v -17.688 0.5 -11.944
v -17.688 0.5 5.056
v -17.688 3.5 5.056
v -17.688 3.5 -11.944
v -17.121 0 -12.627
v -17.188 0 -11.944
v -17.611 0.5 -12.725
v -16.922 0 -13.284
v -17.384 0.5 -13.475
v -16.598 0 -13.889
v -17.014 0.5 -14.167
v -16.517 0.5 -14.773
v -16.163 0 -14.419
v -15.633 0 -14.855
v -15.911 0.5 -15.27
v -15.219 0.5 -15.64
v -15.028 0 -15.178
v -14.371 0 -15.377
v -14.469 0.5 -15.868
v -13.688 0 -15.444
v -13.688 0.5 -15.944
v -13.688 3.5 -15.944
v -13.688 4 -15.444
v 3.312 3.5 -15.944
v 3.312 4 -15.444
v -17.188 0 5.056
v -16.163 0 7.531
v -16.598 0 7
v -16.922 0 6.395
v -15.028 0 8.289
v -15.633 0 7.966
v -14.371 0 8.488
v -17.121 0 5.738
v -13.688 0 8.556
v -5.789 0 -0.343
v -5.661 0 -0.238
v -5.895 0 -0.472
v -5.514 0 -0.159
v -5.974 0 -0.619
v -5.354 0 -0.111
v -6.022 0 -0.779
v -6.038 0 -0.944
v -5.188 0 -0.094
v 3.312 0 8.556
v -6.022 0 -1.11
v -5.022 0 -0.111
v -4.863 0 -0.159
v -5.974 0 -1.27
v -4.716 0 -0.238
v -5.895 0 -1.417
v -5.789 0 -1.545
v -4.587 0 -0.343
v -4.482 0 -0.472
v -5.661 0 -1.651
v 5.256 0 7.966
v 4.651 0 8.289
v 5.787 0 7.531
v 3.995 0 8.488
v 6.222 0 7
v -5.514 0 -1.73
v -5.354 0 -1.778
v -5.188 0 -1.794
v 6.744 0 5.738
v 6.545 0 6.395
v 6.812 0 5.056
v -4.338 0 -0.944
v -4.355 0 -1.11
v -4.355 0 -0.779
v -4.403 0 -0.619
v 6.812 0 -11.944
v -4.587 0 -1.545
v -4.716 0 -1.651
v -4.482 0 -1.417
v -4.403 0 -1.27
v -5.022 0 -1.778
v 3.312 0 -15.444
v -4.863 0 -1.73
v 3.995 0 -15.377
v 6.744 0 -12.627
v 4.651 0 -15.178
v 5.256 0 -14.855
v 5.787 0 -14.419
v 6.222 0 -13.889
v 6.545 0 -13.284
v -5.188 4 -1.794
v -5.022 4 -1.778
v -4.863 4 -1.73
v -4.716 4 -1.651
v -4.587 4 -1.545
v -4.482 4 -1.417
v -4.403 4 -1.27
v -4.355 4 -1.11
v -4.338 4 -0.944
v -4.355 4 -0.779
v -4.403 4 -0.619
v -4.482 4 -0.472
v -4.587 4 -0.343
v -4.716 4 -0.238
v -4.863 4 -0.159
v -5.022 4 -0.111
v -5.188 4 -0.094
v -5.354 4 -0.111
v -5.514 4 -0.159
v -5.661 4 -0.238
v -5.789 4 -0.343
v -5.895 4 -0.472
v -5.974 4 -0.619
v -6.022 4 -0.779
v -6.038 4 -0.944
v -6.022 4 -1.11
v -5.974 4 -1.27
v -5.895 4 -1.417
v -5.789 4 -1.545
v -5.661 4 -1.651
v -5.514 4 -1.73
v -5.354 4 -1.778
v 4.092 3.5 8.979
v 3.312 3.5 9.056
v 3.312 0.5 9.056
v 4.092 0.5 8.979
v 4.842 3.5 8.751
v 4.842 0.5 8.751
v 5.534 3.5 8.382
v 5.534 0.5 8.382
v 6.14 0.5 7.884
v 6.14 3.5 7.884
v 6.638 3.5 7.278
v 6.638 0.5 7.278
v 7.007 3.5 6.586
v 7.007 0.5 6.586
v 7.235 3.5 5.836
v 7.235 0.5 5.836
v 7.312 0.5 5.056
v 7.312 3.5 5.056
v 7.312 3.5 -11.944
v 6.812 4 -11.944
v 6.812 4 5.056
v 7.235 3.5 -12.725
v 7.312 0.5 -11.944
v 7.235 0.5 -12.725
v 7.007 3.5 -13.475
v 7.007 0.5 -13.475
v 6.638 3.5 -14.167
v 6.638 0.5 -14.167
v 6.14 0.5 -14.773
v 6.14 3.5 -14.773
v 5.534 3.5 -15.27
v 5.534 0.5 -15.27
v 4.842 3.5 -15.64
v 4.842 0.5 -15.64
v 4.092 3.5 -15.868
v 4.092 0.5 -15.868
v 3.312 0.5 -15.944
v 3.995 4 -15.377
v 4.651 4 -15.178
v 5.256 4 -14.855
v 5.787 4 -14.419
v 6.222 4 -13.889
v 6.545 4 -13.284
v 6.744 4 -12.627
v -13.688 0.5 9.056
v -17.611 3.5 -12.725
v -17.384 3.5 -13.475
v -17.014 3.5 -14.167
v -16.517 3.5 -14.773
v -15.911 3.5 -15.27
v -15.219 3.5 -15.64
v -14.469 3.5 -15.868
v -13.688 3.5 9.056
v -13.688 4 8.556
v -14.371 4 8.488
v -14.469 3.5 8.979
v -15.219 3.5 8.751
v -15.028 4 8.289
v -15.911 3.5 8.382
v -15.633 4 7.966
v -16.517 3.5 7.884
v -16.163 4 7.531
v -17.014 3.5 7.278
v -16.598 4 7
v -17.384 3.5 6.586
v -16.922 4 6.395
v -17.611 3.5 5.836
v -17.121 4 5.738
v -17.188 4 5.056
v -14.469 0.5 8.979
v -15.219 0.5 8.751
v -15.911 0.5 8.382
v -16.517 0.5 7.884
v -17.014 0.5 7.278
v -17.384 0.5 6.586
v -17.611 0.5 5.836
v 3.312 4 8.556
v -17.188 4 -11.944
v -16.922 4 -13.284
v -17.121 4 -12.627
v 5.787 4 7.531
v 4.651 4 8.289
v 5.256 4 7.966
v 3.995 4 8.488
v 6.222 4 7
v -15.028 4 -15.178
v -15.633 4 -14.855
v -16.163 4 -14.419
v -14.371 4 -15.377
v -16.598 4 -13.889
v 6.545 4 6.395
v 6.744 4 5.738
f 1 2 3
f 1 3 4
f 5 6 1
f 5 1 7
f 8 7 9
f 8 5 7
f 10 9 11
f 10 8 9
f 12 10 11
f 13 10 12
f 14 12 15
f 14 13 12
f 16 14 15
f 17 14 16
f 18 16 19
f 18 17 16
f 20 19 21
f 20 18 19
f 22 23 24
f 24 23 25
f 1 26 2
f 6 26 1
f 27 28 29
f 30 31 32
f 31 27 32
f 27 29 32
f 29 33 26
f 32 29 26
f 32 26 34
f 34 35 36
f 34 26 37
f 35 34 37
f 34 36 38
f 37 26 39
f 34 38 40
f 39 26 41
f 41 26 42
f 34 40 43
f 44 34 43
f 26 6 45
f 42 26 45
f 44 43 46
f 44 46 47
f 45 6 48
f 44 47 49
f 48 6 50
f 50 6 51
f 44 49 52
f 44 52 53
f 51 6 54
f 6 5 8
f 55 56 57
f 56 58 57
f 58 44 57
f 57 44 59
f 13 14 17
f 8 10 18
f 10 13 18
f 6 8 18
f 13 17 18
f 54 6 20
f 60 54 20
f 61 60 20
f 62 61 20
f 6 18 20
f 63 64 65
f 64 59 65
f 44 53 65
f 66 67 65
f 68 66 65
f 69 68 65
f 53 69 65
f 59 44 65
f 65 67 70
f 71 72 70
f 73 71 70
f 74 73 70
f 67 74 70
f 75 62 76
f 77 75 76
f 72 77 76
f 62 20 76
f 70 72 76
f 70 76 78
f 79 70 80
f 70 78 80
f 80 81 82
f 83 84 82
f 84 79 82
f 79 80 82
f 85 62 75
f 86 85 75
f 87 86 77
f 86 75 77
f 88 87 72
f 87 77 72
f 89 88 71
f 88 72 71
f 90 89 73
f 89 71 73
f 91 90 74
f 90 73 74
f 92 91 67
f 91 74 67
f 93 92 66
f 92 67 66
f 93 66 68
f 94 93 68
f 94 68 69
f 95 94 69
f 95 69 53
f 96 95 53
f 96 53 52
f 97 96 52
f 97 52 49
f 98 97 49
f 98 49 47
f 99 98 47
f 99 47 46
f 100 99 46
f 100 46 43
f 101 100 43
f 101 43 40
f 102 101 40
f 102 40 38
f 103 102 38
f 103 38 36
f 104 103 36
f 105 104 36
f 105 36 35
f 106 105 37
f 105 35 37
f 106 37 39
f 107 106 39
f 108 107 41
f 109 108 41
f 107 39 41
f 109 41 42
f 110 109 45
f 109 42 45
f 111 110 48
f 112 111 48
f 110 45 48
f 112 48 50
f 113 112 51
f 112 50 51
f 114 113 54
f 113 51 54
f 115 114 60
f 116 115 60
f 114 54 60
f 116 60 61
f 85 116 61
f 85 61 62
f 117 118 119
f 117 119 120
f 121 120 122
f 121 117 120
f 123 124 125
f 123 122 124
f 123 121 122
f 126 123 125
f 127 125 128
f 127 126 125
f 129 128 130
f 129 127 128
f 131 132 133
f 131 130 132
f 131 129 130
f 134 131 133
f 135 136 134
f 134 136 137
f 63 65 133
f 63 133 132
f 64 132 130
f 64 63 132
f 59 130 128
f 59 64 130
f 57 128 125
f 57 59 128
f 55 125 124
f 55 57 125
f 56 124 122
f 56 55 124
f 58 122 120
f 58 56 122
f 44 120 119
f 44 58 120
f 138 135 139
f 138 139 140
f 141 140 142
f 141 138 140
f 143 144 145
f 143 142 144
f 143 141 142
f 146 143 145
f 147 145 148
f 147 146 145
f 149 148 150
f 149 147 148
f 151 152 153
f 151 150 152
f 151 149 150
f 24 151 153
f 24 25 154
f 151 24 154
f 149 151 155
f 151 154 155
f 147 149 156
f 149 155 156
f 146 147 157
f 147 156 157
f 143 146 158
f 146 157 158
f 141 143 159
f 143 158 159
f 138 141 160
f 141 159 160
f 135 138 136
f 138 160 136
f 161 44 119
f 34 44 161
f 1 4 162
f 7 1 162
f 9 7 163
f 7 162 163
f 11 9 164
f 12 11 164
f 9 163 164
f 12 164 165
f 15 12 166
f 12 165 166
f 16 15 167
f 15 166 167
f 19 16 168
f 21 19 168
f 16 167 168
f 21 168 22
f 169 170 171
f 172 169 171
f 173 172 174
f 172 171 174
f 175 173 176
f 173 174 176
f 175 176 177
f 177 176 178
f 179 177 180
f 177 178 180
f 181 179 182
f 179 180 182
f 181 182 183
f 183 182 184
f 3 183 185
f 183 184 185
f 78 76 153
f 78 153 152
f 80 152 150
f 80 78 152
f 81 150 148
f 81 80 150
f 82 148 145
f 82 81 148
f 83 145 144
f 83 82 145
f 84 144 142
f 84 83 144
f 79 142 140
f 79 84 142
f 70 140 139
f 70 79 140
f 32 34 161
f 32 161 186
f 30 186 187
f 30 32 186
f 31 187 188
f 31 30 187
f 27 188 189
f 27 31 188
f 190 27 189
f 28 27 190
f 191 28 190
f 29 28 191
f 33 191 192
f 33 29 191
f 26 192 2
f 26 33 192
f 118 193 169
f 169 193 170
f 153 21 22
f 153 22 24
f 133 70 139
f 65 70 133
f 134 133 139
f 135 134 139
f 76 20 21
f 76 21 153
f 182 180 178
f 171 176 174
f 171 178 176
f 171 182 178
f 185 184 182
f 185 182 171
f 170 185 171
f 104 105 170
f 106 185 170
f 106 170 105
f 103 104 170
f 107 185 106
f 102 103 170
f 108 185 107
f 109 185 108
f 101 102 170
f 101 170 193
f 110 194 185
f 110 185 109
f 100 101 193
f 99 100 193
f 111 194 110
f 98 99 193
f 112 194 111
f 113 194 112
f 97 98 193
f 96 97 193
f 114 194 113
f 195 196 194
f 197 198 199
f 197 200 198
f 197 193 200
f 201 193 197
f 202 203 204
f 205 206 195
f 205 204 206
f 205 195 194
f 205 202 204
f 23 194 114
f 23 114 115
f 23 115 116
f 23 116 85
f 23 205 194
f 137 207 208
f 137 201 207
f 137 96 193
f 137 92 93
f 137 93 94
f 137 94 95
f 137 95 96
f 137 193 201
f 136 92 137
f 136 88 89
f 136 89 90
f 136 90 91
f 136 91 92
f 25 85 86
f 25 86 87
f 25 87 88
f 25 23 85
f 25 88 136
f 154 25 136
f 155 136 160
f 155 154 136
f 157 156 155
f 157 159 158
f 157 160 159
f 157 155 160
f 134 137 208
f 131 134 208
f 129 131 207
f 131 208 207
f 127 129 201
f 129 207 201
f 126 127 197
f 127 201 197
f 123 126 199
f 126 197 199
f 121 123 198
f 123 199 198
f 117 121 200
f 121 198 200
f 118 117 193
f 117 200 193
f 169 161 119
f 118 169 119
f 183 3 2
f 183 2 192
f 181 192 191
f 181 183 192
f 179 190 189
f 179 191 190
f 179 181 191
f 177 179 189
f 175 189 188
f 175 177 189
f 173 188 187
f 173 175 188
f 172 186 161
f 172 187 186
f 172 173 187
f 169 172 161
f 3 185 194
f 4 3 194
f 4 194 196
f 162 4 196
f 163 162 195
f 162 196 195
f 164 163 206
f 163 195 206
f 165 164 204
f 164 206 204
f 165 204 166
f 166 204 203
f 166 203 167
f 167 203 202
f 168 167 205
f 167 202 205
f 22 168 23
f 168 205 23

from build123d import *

# Parameters (mm, degrees)
SKETCH1_W                      = 25
SKETCH1_H                      = 25
BOSS_EXTRUDE1_DEPTH            = 4
FILLET1_R                      = 4
F_1_7_1_7_DIAMETER_HOLE1_D     = 1.7
F_1_7_1_7_DIAMETER_HOLE1_DEPTH = 8.5
CHAMFER1_SIZE                  = 0.5


with BuildPart() as part:
    # Sketch1 → Boss-Extrude1 (new body)
    with BuildSketch(Plane(origin=(0, 0, 0), x_dir=(1, 0, 0), z_dir=(0, 1, 0))):
        with Locations((-5.188287333, 3.444371681)):
            Rectangle(SKETCH1_W, SKETCH1_H)
    extrude(amount=BOSS_EXTRUDE1_DEPTH)

    # Fillet1
    fillet1_edges = [part.edges().sort_by_distance(p)[0] for p in [
        (-17.688287333, 2, -15.944371681),
        (7.311712667, 2, -15.944371681),
        (7.311712667, 2, 9.055628319),
        (-17.688287333, 2, 9.055628319),
    ]]
    fillet(fillet1_edges, radius=FILLET1_R)

    # Ø1.7 (1.7) Diameter Hole1
    with Locations(Plane(origin=(-5.188287333, 4, -0.944371681), x_dir=(0, 0, 1), z_dir=(0, 1, 0))):
        with Locations((0, 0)):
            Hole(F_1_7_1_7_DIAMETER_HOLE1_D / 2, depth=F_1_7_1_7_DIAMETER_HOLE1_DEPTH)

    # Chamfer1
    chamfer1_edges = [part.edges().sort_by_distance(p)[0] for p in [
        (-17.688287333, 0, -3.444371681),
        (-17.688287333, 4, -3.444371681),
        (-5.188287333, 0, -15.944371681),
        (7.311712667, 0, -3.444371681),
        (-5.188287333, 0, 9.055628319),
        (-16.516714458, 0, 7.884055444),
        (6.140139792, 0, 7.884055444),
        (6.140139792, 0, -14.772798805),
        (-16.516714458, 0, -14.772798805),
        (-5.188287333, 4, -15.944371681),
        (-5.188287333, 4, 9.055628319),
        (7.311712667, 4, -3.444371681),
        (-16.516714458, 4, 7.884055444),
        (6.140139792, 4, 7.884055444),
        (6.140139792, 4, -14.772798805),
        (-16.516714458, 4, -14.772798805),
    ]]
    chamfer(chamfer1_edges, length=CHAMFER1_SIZE)


solid = part.part
